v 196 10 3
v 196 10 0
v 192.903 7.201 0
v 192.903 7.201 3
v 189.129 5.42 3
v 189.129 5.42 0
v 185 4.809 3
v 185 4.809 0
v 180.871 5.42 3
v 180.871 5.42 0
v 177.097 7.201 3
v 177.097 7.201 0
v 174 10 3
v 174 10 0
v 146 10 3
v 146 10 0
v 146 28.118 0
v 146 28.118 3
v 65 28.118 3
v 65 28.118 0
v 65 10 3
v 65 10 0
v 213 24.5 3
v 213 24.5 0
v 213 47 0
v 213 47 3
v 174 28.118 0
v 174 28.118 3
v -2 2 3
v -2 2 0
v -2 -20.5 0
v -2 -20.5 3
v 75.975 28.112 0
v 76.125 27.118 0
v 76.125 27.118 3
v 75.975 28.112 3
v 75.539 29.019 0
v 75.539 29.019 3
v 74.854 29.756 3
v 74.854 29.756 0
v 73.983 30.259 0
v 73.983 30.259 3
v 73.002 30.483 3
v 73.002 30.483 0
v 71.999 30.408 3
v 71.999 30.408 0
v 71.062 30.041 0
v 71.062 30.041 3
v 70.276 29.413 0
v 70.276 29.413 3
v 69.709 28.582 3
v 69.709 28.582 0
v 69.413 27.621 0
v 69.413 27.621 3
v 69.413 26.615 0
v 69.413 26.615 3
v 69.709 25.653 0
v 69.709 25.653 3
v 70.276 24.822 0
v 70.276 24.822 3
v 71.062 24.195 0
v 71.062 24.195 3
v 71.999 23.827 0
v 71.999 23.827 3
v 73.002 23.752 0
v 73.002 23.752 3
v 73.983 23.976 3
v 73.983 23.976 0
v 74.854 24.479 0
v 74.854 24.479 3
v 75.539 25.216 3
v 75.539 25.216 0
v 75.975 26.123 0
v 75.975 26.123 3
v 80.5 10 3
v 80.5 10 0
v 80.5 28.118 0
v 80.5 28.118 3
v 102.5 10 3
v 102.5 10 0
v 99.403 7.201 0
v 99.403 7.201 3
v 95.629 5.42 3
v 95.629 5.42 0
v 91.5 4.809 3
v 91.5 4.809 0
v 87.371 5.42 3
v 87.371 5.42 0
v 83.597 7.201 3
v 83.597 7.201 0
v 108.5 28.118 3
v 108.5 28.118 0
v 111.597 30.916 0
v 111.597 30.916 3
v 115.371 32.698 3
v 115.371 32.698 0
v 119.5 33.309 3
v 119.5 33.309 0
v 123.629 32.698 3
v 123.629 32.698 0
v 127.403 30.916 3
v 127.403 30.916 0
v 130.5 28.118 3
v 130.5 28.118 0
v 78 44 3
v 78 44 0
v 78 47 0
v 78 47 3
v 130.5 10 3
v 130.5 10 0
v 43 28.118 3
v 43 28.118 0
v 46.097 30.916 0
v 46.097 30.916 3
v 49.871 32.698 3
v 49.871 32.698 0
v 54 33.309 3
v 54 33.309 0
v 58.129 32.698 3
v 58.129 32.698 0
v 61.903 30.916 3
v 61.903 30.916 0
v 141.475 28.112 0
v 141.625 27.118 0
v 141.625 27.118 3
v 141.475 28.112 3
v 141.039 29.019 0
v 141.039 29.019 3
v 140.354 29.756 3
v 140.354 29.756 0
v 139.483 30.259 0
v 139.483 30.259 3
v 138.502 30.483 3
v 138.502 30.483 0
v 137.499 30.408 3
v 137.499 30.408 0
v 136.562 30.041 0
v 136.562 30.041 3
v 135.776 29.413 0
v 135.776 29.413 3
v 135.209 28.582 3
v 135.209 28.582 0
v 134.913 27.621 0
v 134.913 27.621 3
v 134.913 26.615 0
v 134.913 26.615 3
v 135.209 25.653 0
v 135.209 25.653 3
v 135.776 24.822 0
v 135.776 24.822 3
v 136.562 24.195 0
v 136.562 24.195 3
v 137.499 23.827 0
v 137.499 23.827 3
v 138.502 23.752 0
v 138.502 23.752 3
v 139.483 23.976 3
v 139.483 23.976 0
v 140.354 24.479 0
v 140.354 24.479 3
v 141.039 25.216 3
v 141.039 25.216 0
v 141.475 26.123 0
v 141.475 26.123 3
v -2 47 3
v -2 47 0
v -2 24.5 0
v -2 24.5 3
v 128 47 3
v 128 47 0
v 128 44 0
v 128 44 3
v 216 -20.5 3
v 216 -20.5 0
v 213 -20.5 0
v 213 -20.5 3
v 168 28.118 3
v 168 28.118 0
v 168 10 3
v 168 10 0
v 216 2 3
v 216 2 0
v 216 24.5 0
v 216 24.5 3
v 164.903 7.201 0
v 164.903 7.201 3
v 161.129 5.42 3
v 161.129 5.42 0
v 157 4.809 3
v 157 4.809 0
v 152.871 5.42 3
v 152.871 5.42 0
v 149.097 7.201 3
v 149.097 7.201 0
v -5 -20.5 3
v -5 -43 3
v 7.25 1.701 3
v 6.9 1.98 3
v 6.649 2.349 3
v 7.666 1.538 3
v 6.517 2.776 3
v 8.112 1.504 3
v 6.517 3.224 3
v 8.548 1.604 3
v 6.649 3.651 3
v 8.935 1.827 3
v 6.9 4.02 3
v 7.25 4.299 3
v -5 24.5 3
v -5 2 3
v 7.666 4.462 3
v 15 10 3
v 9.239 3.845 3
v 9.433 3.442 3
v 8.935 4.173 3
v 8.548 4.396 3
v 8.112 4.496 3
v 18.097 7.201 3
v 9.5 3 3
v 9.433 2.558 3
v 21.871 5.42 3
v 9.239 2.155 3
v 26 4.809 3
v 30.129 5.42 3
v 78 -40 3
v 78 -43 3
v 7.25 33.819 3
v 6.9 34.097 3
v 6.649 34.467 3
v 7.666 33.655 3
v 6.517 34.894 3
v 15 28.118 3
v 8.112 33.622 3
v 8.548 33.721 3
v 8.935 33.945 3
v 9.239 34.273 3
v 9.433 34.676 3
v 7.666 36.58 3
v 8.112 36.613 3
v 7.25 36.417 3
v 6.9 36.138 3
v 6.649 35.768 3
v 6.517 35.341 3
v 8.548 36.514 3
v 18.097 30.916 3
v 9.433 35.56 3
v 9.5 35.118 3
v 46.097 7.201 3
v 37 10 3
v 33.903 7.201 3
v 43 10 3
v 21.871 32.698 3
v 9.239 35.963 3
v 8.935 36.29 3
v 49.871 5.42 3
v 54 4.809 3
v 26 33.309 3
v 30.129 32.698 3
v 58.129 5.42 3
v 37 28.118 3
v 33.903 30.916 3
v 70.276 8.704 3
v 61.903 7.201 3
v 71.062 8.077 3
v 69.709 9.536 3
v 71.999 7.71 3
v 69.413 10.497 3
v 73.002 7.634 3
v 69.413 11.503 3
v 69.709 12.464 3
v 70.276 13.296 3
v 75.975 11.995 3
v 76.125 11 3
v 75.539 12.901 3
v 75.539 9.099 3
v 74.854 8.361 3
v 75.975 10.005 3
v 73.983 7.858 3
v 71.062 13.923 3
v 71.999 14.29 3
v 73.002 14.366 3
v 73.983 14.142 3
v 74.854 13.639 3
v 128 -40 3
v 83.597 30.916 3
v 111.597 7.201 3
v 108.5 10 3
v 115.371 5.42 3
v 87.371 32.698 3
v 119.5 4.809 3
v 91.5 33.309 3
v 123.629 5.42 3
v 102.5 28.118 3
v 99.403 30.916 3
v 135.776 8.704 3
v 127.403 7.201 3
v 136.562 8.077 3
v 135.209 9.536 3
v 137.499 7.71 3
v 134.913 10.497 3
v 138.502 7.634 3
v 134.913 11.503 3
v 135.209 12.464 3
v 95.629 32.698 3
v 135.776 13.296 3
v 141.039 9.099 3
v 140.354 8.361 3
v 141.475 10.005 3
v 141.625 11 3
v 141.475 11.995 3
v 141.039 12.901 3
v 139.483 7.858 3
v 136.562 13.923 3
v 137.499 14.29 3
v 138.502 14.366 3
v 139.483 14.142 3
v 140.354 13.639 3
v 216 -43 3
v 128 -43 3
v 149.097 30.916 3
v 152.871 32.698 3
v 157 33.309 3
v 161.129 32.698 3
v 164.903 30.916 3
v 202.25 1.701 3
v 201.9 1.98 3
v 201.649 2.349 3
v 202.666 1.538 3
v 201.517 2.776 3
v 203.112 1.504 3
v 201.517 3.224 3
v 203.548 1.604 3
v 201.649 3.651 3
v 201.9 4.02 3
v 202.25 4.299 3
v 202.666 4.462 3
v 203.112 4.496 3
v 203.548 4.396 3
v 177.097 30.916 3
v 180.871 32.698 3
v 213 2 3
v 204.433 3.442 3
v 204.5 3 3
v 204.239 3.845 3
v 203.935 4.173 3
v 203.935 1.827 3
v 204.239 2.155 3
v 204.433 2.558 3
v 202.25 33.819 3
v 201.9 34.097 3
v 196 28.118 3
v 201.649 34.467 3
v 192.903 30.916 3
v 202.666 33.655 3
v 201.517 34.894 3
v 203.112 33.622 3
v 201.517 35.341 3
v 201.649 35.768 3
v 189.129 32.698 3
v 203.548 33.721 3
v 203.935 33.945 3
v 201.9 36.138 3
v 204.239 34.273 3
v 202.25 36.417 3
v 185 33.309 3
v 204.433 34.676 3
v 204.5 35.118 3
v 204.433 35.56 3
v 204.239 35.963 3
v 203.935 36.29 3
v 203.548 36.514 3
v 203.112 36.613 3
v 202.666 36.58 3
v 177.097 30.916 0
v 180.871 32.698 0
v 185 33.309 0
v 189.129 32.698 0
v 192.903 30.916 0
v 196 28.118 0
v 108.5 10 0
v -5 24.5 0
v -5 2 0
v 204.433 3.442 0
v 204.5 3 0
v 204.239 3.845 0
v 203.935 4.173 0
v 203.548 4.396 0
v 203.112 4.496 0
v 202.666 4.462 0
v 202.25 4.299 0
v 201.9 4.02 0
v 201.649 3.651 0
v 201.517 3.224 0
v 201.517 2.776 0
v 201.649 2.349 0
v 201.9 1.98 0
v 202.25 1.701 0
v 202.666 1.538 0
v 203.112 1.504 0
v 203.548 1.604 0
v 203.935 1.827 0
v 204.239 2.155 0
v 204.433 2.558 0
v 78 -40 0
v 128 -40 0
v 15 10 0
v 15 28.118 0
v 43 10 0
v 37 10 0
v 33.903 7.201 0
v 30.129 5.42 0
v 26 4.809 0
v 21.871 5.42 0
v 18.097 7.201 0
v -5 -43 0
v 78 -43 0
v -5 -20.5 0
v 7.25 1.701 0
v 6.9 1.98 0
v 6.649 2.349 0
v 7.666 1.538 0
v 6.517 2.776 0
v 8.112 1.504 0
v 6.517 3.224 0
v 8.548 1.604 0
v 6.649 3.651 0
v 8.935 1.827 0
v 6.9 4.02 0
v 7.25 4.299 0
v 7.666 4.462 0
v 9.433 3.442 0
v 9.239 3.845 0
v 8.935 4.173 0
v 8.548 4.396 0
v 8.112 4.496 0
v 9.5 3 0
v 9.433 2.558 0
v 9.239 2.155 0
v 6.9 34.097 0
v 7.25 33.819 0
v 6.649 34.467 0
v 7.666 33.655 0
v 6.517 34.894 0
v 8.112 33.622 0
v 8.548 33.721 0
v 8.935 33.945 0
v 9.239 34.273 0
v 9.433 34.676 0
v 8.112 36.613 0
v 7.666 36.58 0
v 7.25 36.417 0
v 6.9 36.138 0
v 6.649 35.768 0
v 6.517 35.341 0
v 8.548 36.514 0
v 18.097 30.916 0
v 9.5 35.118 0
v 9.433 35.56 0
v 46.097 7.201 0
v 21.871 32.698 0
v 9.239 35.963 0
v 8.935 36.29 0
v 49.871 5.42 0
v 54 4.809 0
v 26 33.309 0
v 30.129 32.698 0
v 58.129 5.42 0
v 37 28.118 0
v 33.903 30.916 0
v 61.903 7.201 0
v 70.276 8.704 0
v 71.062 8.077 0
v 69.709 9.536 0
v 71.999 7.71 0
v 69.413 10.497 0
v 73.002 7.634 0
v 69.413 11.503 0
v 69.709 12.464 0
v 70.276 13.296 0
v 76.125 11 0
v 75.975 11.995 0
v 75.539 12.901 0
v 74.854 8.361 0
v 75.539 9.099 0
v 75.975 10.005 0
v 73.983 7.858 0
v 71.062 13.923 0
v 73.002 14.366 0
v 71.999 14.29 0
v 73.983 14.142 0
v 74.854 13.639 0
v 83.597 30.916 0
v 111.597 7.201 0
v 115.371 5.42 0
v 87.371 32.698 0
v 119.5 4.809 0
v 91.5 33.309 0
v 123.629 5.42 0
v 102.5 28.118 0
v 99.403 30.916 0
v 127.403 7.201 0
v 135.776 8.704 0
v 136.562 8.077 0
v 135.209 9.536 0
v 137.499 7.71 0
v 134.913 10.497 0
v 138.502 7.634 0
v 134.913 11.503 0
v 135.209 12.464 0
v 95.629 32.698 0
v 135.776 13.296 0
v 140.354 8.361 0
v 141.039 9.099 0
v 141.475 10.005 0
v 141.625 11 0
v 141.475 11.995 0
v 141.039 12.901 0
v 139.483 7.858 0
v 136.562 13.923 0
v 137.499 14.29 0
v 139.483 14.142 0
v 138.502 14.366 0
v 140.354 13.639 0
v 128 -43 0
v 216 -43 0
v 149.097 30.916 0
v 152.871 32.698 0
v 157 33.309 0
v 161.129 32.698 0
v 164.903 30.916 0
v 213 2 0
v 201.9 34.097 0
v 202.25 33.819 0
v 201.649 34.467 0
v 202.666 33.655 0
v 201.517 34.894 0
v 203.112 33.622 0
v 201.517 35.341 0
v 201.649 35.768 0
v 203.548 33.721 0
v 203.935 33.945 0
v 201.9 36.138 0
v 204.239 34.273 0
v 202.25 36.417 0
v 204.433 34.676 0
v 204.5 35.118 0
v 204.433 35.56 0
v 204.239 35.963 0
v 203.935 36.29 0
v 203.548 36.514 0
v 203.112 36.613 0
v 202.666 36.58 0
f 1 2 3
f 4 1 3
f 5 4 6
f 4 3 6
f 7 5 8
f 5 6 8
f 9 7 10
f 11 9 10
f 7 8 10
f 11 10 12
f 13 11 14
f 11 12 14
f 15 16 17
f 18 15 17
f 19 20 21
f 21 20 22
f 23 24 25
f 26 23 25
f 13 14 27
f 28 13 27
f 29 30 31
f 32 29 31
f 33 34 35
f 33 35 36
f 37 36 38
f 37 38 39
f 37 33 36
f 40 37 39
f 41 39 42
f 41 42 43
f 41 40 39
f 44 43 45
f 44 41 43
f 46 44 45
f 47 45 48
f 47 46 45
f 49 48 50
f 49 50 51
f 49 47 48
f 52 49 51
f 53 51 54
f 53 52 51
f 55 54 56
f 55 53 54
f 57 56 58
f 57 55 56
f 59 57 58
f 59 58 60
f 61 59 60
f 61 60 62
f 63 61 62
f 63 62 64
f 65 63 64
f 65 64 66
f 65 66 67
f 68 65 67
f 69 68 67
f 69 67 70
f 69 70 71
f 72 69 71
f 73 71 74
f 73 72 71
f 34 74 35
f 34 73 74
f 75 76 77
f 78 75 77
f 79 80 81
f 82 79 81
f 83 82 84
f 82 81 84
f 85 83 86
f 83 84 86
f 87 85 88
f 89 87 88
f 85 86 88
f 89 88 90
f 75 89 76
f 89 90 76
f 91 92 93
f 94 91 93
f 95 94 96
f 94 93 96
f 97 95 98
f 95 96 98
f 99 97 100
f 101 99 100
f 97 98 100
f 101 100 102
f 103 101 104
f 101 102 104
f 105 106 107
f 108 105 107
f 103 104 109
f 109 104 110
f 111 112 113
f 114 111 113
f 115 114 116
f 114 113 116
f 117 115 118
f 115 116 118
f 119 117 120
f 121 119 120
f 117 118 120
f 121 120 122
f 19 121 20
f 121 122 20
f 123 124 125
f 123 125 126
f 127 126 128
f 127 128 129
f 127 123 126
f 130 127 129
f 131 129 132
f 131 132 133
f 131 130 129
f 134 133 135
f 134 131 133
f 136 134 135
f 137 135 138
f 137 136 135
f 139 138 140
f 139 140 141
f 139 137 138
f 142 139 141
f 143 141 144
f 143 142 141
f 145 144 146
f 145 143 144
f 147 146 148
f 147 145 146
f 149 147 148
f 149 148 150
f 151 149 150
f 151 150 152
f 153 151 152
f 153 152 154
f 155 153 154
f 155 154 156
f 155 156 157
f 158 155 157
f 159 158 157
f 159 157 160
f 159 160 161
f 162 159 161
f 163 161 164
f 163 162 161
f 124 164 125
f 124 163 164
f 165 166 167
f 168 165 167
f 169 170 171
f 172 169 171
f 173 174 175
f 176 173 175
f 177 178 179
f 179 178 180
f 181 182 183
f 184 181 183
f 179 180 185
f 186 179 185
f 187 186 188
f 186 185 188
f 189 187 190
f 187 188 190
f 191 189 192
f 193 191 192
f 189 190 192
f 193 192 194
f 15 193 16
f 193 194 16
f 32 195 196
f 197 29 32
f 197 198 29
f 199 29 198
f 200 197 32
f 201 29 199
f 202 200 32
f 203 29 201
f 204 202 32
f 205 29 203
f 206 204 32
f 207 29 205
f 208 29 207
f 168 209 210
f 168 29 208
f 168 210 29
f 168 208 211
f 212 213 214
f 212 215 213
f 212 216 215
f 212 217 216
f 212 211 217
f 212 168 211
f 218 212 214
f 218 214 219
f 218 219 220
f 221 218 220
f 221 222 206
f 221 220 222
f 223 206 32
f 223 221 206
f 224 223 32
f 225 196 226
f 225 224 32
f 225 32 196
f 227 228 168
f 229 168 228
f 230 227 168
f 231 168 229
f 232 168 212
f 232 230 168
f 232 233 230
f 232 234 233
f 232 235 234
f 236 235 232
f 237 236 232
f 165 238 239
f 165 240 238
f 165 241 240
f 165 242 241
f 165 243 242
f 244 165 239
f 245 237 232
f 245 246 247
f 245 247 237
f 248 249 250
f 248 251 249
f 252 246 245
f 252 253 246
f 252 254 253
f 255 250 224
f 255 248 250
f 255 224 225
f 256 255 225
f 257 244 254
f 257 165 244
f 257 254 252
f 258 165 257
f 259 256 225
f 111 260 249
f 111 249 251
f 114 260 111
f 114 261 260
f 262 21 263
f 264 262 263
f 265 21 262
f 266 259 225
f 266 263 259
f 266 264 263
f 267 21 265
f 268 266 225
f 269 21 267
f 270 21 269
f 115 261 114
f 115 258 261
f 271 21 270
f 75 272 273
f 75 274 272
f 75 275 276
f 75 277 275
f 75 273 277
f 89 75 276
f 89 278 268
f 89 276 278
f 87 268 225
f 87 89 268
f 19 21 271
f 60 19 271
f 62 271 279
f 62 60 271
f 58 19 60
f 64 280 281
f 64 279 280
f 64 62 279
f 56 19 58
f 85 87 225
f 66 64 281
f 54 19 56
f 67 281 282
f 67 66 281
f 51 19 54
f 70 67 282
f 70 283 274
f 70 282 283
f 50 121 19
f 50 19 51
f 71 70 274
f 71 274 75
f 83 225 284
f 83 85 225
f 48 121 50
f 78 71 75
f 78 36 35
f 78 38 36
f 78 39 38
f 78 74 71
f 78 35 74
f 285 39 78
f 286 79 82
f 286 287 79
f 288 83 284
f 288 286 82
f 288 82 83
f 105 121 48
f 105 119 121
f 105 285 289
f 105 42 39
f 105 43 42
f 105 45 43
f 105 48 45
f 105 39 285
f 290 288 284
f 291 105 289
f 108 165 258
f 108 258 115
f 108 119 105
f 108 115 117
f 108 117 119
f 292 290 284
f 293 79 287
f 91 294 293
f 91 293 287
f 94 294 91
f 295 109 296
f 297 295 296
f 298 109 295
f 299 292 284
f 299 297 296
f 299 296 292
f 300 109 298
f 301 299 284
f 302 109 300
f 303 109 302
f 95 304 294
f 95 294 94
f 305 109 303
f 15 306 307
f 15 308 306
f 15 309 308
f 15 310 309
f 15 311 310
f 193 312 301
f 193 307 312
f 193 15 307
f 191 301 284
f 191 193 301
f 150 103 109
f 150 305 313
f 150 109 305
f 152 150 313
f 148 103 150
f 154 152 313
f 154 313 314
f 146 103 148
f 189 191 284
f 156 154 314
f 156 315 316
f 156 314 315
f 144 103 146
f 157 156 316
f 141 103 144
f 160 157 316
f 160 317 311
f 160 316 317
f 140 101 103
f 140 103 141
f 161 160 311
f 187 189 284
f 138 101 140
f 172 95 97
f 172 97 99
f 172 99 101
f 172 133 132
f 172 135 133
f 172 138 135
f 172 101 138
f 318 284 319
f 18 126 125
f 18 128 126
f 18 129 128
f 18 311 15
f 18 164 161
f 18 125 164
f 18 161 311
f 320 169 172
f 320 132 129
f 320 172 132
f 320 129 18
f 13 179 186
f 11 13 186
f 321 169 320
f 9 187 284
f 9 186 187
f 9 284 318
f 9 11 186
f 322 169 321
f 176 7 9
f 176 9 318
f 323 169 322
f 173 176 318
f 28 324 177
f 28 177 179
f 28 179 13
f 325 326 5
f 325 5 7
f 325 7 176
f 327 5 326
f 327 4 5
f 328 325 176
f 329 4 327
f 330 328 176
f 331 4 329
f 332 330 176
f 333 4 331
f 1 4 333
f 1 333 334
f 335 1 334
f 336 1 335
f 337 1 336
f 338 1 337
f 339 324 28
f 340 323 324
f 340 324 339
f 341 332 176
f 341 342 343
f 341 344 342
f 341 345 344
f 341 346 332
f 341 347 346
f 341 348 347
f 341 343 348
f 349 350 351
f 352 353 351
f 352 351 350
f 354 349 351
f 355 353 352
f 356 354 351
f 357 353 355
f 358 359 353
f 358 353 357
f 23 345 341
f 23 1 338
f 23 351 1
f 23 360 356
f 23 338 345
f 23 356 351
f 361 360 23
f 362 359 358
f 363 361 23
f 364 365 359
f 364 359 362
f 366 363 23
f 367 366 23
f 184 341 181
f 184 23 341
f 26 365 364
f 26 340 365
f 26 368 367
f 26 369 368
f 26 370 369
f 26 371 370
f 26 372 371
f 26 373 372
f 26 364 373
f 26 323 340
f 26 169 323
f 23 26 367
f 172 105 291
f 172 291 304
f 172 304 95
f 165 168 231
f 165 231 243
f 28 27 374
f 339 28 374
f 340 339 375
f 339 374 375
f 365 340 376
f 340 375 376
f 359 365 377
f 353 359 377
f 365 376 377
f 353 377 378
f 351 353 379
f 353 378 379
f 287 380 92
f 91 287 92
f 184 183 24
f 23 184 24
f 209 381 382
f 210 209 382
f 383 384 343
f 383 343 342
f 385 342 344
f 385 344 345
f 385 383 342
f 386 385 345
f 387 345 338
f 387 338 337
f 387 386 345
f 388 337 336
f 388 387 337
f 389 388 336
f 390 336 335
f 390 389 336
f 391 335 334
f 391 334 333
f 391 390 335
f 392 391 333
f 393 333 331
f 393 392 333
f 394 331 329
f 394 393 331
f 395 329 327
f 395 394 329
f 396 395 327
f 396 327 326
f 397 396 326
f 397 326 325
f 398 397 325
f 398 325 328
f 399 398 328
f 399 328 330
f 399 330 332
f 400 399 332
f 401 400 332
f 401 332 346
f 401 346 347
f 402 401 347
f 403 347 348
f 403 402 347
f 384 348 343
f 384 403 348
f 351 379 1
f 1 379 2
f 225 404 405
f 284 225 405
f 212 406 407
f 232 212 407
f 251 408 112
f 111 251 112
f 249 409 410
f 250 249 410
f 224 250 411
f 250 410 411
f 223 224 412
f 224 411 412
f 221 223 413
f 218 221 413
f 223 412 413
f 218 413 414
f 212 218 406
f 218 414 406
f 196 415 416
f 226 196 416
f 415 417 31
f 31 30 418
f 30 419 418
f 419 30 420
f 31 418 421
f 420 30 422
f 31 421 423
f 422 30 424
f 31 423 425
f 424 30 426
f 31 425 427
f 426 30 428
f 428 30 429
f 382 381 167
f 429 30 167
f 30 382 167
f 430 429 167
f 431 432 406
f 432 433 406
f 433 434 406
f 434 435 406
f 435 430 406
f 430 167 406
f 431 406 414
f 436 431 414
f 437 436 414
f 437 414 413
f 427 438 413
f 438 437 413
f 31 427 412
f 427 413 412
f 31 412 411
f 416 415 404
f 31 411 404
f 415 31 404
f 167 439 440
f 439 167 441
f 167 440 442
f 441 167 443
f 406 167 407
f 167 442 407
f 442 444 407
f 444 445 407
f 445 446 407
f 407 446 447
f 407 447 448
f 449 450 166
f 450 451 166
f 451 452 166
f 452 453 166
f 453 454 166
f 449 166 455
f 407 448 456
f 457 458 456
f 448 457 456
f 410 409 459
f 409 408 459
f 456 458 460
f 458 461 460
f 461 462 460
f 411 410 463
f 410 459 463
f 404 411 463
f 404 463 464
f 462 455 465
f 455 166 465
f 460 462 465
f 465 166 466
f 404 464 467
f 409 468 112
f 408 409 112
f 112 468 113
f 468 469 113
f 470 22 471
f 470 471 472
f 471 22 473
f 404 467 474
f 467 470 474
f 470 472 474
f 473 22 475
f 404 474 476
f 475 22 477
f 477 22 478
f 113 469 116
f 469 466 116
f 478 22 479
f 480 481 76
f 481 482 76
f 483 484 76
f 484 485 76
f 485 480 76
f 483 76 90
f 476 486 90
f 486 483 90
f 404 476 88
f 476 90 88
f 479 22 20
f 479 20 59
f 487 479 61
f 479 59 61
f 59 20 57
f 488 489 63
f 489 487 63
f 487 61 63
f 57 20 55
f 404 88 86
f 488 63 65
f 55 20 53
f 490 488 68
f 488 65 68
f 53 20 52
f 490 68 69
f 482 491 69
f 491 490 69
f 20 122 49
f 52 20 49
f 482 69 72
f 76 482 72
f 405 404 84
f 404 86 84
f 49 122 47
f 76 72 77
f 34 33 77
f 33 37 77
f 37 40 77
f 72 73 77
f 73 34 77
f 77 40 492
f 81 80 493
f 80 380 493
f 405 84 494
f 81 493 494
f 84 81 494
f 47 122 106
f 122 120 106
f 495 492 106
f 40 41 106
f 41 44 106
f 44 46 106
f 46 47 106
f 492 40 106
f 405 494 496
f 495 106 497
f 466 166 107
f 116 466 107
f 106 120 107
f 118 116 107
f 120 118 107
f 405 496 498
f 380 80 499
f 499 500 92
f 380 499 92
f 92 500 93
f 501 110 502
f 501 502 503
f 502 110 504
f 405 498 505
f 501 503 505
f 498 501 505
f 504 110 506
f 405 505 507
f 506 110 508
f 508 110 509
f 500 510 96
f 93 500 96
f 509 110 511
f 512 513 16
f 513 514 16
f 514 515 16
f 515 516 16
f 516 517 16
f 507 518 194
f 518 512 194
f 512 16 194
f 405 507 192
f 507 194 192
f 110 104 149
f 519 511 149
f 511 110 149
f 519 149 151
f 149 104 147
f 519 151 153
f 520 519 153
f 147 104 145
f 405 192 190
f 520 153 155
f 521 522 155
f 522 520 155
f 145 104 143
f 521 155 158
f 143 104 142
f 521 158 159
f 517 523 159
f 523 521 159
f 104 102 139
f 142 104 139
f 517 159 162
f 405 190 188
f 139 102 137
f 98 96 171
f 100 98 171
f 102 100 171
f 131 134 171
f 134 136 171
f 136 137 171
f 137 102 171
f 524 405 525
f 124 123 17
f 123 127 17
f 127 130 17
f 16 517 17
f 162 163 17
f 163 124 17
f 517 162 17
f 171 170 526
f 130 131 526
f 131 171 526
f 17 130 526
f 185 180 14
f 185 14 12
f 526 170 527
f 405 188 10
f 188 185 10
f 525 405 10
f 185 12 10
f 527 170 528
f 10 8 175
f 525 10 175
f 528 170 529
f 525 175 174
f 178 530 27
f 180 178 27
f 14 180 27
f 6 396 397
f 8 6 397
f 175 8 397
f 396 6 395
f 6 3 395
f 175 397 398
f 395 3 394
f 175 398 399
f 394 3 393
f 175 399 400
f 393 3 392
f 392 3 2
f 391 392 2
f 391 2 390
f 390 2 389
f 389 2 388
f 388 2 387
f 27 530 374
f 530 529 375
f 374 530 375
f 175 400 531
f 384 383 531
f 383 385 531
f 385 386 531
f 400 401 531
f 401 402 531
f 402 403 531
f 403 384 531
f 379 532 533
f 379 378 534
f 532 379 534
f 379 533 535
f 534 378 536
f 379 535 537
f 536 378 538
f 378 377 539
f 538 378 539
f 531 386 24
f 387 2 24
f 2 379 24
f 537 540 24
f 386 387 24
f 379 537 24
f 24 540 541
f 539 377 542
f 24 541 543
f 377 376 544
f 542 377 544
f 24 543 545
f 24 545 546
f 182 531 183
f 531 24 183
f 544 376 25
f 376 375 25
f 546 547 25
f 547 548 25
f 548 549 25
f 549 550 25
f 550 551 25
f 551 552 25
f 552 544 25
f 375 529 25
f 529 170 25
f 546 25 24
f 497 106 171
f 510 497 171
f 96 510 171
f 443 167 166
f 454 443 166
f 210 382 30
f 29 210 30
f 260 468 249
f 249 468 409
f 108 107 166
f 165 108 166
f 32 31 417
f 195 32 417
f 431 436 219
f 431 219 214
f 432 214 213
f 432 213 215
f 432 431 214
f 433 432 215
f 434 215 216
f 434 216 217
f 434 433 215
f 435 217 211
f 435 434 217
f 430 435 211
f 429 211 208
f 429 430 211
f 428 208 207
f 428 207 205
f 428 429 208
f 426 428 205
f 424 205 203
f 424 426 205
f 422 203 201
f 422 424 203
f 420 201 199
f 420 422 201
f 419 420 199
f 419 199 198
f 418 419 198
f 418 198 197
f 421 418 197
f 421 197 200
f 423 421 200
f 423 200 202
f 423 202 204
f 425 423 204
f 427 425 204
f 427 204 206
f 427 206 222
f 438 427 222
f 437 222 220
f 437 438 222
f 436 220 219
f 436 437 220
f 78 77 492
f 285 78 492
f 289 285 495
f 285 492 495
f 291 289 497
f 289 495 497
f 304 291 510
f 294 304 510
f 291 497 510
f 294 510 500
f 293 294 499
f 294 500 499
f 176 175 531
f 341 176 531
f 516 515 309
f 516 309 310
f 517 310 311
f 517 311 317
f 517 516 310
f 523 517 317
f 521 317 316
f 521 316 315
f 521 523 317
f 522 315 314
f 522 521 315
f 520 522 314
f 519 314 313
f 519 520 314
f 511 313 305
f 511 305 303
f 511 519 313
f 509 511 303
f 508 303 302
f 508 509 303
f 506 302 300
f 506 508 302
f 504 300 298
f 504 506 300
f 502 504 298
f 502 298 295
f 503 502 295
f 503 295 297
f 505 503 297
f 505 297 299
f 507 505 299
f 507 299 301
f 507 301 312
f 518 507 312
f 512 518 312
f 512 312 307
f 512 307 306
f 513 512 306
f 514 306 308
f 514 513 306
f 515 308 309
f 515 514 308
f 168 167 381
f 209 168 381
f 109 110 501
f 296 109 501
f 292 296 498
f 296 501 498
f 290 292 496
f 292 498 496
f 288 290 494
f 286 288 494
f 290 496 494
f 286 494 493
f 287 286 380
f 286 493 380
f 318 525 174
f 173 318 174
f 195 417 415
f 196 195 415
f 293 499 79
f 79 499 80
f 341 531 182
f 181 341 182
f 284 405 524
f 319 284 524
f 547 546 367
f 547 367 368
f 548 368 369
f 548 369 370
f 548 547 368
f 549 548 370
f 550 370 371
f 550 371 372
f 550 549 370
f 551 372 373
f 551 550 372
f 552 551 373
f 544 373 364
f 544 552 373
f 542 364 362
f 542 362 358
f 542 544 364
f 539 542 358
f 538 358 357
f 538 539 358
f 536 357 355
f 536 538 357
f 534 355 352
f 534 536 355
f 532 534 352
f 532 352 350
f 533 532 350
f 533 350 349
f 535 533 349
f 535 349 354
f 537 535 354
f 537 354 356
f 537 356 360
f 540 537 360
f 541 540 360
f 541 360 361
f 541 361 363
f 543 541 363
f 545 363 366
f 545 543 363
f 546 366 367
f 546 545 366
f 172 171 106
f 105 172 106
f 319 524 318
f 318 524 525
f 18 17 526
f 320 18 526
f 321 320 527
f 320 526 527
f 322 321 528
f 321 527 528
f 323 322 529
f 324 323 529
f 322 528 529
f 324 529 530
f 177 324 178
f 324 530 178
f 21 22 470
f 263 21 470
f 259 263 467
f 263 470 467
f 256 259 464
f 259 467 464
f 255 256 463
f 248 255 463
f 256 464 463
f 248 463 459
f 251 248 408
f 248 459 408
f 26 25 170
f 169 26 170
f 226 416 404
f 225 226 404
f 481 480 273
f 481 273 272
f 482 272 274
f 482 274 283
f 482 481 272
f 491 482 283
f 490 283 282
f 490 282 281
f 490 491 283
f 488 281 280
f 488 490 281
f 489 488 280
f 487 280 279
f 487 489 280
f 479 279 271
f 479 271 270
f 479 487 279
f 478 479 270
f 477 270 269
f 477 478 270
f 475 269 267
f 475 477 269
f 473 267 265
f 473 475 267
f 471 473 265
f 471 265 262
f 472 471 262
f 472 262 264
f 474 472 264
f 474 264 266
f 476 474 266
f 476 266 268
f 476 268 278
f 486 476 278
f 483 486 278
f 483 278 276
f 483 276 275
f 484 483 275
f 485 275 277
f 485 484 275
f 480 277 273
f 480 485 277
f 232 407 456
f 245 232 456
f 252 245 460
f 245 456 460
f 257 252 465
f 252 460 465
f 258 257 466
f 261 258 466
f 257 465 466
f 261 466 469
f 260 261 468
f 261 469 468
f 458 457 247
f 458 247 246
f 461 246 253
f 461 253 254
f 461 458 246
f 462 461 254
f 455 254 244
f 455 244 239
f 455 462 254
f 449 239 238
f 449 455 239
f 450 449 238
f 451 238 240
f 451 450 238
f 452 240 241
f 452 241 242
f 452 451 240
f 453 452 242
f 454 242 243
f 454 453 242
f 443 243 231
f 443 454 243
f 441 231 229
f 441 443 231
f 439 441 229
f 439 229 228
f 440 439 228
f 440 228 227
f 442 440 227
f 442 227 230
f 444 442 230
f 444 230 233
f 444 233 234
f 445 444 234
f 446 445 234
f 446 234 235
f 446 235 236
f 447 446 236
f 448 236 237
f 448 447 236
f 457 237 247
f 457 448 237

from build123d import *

# Parameters (mm, degrees)
SKETCH1_R           = 1.5
SKETCH1_R_2         = 3.375
BOSS_EXTRUDE1_DEPTH = 3


with BuildPart() as part:
    # Sketch1 → Boss-Extrude1 (new body)
    with BuildSketch(Plane.XY):
        Polygon((213, -20.5), (213, 2), (216, 2), (216, 24.5), (213, 24.5), (213, 47), (128, 47), (128, 44), (78, 44), (78, 47), (-2, 47), (-2, 24.5), (-5, 24.5), (-5, 2), (-2, 2), (-2, -20.5), (-5, -20.5), (-5, -43), (-2, -43), (78, -43), (78, -40), (128, -40), (128, -43), (213, -43), (216, -43), (216, -20.5), align=None)
        with Locations((8, 35.117670932)):
            Circle(SKETCH1_R, mode=Mode.SUBTRACT)
        with Locations((8, 3)):
            Circle(SKETCH1_R, mode=Mode.SUBTRACT)
        with Locations((203, 3)):
            Circle(SKETCH1_R, mode=Mode.SUBTRACT)
        with Locations((203, 35.117670932)):
            Circle(SKETCH1_R, mode=Mode.SUBTRACT)
        with Locations((72.75, 27.117670932)):
            Circle(SKETCH1_R_2, mode=Mode.SUBTRACT)
        with Locations((72.75, 11)):
            Circle(SKETCH1_R_2, mode=Mode.SUBTRACT)
        with Locations((138.25, 27.117670932)):
            Circle(SKETCH1_R_2, mode=Mode.SUBTRACT)
        with Locations((138.25, 11)):
            Circle(SKETCH1_R_2, mode=Mode.SUBTRACT)
        with BuildLine():
            Line((15, 10), (15, 28.117670932))
            ThreePointArc((15, 28.117670932), (26, 33.308835466), (37, 28.117670932))
            Line((37, 28.117670932), (37, 10))
            ThreePointArc((37, 10), (26, 4.808835466), (15, 10))
        make_face(mode=Mode.SUBTRACT)
        with BuildLine():
            Line((43, 10), (43, 28.117670932))
            ThreePointArc((43, 28.117670932), (54, 33.308835466), (65, 28.117670932))
            Line((65, 28.117670932), (65, 10))
            ThreePointArc((65, 10), (54, 4.808835466), (43, 10))
        make_face(mode=Mode.SUBTRACT)
        with BuildLine():
            Line((80.5, 10), (80.5, 28.117670932))
            ThreePointArc((80.5, 28.117670932), (91.5, 33.308835466), (102.5, 28.117670932))
            Line((102.5, 28.117670932), (102.5, 10))
            ThreePointArc((102.5, 10), (91.5, 4.808835466), (80.5, 10))
        make_face(mode=Mode.SUBTRACT)
        with BuildLine():
            Line((108.5, 10), (108.5, 28.117670932))
            ThreePointArc((108.5, 28.117670932), (119.5, 33.308835466), (130.5, 28.117670932))
            Line((130.5, 28.117670932), (130.5, 10))
            ThreePointArc((130.5, 10), (119.5, 4.808835466), (108.5, 10))
        make_face(mode=Mode.SUBTRACT)
        with BuildLine():
            Line((146, 10), (146, 28.117670932))
            ThreePointArc((146, 28.117670932), (157, 33.308835466), (168, 28.117670932))
            Line((168, 28.117670932), (168, 10))
            ThreePointArc((168, 10), (157, 4.808835466), (146, 10))
        make_face(mode=Mode.SUBTRACT)
        with BuildLine():
            Line((174, 10), (174, 28.117670932))
            ThreePointArc((174, 28.117670932), (185, 33.308835466), (196, 28.117670932))
            Line((196, 28.117670932), (196, 10))
            ThreePointArc((196, 10), (185, 4.808835466), (174, 10))
        make_face(mode=Mode.SUBTRACT)
    extrude(amount=BOSS_EXTRUDE1_DEPTH)


solid = part.part
